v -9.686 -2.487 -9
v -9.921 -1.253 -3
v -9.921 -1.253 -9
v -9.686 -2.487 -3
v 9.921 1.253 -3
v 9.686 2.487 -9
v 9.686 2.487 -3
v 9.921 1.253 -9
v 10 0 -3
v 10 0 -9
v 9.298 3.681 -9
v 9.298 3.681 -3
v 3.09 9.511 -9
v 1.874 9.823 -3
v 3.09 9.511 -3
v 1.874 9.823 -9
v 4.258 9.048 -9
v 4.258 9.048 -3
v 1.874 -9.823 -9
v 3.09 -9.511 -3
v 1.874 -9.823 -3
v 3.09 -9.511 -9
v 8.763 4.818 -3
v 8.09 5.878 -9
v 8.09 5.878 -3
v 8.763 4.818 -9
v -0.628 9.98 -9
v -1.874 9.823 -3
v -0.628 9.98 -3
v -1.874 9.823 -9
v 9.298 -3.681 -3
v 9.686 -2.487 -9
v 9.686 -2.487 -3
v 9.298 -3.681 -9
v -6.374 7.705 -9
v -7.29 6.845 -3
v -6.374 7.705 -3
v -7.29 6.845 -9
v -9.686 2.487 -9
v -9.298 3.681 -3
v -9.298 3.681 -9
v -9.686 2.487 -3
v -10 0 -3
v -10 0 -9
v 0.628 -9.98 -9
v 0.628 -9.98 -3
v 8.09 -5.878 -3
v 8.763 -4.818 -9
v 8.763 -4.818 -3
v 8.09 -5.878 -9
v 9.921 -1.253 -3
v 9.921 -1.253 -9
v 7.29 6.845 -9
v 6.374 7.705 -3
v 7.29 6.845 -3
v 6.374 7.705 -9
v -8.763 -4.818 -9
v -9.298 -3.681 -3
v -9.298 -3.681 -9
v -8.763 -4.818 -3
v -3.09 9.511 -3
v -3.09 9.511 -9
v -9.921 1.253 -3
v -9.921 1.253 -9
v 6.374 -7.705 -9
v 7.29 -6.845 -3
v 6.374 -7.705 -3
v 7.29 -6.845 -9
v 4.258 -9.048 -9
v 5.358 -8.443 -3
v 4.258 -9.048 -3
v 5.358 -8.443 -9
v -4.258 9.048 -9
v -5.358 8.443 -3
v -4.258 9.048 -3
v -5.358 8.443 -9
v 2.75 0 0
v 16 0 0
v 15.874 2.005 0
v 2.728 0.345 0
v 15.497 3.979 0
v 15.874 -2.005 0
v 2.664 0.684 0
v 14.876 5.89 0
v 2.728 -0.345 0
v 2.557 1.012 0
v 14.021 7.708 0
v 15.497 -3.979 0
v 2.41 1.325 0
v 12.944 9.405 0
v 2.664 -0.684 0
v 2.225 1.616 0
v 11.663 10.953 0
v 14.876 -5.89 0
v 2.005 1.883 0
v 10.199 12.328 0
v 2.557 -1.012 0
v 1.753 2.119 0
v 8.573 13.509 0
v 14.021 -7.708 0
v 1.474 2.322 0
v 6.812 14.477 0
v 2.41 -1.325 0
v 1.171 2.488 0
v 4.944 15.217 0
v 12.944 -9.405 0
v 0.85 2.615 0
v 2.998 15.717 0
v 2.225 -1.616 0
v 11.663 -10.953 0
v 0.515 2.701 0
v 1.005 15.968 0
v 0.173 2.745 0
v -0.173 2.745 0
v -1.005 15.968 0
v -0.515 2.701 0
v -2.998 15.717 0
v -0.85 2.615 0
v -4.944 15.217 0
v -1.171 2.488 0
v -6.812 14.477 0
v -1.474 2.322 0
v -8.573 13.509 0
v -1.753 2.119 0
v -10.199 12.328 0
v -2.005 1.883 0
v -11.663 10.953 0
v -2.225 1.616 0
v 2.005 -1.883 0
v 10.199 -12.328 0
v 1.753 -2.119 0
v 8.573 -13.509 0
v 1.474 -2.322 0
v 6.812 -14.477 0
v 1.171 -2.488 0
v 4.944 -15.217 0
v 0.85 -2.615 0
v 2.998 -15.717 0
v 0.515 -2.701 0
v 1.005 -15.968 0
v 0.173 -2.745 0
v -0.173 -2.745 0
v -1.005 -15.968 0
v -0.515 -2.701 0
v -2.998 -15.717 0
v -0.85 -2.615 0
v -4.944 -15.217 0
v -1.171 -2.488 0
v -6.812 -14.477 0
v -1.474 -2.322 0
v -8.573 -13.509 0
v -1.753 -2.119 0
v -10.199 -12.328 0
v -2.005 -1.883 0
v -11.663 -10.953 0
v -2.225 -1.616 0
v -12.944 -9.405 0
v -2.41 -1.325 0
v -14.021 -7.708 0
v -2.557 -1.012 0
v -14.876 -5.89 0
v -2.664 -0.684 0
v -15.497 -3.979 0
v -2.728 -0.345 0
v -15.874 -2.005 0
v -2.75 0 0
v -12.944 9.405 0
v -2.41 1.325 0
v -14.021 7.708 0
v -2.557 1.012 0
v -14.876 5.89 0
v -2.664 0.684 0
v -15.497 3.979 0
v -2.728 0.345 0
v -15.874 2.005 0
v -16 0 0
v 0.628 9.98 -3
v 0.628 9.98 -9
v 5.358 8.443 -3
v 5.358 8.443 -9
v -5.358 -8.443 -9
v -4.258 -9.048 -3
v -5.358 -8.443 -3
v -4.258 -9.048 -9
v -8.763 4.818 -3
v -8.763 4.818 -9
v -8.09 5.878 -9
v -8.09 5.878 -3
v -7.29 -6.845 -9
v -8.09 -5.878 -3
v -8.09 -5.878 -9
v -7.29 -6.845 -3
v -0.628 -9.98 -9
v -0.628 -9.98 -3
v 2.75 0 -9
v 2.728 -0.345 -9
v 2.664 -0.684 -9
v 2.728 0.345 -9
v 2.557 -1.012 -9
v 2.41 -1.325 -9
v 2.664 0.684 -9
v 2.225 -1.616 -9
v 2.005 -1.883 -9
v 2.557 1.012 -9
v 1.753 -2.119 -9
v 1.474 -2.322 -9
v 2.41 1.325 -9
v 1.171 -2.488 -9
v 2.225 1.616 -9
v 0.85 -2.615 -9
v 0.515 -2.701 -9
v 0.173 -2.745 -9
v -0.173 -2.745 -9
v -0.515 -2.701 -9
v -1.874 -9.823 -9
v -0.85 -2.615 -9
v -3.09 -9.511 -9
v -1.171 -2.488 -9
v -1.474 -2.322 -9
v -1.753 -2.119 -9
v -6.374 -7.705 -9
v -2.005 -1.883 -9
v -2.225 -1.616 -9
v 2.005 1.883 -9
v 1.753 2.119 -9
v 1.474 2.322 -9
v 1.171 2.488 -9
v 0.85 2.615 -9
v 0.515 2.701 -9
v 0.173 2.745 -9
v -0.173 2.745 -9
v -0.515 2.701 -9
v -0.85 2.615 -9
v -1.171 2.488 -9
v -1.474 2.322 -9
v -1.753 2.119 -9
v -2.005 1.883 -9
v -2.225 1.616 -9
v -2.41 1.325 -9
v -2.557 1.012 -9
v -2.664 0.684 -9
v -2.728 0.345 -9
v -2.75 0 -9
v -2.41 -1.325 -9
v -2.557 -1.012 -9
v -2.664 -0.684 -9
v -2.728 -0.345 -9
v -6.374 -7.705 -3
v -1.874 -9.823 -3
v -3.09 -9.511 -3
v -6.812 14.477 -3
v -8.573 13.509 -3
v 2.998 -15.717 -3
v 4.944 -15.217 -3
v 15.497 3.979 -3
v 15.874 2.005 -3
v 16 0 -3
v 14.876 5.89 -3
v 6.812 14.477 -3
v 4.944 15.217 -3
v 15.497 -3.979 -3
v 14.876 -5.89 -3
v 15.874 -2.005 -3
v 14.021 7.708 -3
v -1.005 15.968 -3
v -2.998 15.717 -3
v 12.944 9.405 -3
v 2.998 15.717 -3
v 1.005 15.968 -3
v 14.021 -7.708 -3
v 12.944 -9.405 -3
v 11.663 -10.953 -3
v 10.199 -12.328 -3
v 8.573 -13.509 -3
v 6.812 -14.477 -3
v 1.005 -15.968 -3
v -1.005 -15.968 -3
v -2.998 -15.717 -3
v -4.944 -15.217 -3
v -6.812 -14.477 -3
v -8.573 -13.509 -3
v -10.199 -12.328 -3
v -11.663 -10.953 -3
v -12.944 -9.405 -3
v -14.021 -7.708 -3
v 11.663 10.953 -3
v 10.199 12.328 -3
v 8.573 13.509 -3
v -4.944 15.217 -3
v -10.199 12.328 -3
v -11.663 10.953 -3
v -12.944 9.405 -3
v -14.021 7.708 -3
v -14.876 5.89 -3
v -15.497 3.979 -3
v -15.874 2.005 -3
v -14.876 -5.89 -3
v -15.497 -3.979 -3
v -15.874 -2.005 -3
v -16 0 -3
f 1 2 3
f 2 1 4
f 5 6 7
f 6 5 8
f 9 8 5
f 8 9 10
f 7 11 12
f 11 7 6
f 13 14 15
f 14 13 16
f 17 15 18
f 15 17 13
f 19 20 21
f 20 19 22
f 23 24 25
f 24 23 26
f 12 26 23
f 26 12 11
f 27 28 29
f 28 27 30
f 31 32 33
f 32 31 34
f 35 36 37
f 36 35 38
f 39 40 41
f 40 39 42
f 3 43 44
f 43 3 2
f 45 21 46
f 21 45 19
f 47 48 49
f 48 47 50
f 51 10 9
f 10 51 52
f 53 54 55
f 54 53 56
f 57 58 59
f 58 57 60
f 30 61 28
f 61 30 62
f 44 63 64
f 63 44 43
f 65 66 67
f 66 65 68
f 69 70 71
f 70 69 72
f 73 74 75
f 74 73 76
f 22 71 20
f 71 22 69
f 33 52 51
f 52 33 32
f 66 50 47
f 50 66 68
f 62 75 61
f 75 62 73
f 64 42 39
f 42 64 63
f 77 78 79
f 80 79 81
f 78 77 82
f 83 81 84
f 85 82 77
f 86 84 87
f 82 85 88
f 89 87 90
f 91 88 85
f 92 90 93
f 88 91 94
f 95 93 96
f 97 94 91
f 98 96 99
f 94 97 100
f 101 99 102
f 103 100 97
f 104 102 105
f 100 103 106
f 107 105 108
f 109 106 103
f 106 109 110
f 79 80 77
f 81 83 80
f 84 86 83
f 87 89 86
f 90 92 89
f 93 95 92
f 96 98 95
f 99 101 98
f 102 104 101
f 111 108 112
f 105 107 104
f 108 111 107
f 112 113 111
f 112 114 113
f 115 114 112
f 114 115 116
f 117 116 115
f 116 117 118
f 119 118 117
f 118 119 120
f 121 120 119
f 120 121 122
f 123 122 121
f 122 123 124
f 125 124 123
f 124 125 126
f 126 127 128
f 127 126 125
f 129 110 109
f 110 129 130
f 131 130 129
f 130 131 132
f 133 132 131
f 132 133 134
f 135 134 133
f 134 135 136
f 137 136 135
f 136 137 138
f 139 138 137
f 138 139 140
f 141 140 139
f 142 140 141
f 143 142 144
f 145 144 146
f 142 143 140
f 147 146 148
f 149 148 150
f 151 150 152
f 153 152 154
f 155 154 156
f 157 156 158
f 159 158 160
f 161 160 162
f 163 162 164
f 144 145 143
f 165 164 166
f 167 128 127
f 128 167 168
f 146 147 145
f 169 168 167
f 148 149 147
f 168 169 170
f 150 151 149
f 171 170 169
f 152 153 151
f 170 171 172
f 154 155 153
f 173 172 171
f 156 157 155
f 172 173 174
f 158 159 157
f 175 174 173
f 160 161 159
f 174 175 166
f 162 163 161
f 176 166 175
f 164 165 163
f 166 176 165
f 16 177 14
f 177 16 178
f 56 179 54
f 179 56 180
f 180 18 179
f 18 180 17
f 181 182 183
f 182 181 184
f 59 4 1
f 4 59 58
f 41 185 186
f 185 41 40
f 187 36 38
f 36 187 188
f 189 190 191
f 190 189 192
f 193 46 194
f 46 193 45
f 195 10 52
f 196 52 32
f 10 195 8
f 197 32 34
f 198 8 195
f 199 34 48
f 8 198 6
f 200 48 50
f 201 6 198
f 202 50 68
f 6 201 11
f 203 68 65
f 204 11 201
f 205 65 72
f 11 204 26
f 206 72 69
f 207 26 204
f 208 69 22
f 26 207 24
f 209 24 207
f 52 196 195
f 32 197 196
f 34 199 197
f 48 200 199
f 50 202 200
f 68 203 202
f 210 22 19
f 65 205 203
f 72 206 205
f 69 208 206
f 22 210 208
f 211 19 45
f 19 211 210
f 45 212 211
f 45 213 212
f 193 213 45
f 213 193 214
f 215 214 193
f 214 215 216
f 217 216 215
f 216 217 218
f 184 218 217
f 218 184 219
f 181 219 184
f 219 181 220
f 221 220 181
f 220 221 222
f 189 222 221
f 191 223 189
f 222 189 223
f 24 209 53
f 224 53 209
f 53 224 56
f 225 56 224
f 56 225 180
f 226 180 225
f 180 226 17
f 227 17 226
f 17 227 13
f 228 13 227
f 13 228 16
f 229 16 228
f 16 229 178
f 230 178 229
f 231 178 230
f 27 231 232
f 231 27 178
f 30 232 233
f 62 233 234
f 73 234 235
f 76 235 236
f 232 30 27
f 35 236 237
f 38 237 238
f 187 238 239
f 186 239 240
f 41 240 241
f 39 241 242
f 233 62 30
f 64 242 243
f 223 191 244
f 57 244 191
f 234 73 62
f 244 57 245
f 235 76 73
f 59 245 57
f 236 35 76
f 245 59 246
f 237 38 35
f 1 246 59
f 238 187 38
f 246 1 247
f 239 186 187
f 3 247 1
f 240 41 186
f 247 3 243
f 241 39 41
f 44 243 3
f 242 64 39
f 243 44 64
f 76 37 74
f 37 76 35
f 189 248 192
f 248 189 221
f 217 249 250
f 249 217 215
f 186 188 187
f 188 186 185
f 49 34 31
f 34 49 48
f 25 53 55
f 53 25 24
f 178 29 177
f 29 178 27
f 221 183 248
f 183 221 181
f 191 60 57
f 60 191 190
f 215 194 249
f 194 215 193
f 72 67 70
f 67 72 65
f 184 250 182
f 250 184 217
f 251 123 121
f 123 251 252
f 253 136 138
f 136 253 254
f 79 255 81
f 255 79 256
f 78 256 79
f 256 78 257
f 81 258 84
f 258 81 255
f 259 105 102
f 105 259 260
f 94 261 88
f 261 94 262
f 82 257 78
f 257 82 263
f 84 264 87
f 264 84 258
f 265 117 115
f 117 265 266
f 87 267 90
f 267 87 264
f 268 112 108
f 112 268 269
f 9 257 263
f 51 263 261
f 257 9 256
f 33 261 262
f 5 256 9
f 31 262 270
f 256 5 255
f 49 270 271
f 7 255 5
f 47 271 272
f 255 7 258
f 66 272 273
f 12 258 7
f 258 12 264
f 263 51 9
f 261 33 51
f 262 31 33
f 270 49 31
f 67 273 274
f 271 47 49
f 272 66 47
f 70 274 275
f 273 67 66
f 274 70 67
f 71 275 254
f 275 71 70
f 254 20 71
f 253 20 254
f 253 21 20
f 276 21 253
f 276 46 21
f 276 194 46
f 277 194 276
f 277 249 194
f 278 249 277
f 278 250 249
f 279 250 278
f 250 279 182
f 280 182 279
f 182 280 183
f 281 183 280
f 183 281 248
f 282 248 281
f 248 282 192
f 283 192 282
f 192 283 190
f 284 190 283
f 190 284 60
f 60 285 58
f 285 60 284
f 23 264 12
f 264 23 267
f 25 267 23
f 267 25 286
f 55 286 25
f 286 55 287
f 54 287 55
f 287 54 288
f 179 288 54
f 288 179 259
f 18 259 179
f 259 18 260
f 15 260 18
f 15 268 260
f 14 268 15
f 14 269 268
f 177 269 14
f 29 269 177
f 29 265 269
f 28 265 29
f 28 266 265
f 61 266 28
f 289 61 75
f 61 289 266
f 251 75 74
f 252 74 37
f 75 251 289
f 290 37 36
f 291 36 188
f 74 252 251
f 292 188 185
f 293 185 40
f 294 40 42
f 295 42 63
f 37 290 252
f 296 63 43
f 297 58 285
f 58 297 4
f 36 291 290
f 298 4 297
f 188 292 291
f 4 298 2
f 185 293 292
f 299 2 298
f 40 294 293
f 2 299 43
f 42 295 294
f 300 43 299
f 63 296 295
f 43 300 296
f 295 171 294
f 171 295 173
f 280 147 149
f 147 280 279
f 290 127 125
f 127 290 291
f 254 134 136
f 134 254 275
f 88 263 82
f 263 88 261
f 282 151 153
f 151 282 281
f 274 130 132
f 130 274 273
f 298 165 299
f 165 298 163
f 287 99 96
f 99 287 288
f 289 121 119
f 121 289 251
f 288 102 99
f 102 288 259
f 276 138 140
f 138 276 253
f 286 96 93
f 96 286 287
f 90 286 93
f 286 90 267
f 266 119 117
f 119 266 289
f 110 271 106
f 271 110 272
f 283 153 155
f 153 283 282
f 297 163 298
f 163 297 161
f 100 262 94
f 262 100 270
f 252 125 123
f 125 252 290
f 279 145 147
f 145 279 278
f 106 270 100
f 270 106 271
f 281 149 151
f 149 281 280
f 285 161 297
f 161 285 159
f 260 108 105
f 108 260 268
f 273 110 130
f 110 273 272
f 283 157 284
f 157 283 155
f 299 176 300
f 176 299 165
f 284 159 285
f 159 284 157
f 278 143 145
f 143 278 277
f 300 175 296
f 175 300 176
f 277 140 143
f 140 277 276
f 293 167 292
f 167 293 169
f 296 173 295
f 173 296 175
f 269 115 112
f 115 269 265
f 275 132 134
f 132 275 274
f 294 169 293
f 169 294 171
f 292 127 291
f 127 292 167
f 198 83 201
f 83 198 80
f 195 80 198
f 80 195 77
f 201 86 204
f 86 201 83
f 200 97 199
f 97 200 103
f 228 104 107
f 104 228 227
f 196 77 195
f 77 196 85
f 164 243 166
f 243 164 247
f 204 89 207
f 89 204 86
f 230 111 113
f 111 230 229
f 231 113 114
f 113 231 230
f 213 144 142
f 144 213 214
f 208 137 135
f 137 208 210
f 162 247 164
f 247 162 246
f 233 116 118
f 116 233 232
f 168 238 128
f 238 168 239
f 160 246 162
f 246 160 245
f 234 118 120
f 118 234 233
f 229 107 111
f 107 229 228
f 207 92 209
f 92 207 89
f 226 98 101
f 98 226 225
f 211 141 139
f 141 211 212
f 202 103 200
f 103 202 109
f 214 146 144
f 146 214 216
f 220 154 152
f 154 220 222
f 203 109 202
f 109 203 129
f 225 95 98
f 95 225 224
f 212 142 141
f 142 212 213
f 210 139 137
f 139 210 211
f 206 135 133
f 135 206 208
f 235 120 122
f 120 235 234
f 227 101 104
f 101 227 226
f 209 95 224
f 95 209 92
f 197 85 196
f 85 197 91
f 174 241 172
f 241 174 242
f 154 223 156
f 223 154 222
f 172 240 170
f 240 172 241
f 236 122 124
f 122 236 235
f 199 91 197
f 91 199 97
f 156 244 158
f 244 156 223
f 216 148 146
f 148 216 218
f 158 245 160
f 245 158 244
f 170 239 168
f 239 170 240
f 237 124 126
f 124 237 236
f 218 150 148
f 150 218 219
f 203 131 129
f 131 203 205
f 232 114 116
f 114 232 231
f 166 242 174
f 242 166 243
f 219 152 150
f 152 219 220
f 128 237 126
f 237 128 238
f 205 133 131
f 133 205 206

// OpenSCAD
$fn = 50;


difference() {
	union() {
		translate(v = [0, 0, -9.0000000000]) {
			cylinder(h = 9, r = 10.0000000000);
		}
		translate(v = [0, 0, -3.0000000000]) {
			cylinder(h = 3, r = 16.0000000000);
		}
	}
	union() {
		#translate(v = [0, 0, -9]) {
			cylinder(h = 9, r = 2.7500000000);
		}
	}
}
